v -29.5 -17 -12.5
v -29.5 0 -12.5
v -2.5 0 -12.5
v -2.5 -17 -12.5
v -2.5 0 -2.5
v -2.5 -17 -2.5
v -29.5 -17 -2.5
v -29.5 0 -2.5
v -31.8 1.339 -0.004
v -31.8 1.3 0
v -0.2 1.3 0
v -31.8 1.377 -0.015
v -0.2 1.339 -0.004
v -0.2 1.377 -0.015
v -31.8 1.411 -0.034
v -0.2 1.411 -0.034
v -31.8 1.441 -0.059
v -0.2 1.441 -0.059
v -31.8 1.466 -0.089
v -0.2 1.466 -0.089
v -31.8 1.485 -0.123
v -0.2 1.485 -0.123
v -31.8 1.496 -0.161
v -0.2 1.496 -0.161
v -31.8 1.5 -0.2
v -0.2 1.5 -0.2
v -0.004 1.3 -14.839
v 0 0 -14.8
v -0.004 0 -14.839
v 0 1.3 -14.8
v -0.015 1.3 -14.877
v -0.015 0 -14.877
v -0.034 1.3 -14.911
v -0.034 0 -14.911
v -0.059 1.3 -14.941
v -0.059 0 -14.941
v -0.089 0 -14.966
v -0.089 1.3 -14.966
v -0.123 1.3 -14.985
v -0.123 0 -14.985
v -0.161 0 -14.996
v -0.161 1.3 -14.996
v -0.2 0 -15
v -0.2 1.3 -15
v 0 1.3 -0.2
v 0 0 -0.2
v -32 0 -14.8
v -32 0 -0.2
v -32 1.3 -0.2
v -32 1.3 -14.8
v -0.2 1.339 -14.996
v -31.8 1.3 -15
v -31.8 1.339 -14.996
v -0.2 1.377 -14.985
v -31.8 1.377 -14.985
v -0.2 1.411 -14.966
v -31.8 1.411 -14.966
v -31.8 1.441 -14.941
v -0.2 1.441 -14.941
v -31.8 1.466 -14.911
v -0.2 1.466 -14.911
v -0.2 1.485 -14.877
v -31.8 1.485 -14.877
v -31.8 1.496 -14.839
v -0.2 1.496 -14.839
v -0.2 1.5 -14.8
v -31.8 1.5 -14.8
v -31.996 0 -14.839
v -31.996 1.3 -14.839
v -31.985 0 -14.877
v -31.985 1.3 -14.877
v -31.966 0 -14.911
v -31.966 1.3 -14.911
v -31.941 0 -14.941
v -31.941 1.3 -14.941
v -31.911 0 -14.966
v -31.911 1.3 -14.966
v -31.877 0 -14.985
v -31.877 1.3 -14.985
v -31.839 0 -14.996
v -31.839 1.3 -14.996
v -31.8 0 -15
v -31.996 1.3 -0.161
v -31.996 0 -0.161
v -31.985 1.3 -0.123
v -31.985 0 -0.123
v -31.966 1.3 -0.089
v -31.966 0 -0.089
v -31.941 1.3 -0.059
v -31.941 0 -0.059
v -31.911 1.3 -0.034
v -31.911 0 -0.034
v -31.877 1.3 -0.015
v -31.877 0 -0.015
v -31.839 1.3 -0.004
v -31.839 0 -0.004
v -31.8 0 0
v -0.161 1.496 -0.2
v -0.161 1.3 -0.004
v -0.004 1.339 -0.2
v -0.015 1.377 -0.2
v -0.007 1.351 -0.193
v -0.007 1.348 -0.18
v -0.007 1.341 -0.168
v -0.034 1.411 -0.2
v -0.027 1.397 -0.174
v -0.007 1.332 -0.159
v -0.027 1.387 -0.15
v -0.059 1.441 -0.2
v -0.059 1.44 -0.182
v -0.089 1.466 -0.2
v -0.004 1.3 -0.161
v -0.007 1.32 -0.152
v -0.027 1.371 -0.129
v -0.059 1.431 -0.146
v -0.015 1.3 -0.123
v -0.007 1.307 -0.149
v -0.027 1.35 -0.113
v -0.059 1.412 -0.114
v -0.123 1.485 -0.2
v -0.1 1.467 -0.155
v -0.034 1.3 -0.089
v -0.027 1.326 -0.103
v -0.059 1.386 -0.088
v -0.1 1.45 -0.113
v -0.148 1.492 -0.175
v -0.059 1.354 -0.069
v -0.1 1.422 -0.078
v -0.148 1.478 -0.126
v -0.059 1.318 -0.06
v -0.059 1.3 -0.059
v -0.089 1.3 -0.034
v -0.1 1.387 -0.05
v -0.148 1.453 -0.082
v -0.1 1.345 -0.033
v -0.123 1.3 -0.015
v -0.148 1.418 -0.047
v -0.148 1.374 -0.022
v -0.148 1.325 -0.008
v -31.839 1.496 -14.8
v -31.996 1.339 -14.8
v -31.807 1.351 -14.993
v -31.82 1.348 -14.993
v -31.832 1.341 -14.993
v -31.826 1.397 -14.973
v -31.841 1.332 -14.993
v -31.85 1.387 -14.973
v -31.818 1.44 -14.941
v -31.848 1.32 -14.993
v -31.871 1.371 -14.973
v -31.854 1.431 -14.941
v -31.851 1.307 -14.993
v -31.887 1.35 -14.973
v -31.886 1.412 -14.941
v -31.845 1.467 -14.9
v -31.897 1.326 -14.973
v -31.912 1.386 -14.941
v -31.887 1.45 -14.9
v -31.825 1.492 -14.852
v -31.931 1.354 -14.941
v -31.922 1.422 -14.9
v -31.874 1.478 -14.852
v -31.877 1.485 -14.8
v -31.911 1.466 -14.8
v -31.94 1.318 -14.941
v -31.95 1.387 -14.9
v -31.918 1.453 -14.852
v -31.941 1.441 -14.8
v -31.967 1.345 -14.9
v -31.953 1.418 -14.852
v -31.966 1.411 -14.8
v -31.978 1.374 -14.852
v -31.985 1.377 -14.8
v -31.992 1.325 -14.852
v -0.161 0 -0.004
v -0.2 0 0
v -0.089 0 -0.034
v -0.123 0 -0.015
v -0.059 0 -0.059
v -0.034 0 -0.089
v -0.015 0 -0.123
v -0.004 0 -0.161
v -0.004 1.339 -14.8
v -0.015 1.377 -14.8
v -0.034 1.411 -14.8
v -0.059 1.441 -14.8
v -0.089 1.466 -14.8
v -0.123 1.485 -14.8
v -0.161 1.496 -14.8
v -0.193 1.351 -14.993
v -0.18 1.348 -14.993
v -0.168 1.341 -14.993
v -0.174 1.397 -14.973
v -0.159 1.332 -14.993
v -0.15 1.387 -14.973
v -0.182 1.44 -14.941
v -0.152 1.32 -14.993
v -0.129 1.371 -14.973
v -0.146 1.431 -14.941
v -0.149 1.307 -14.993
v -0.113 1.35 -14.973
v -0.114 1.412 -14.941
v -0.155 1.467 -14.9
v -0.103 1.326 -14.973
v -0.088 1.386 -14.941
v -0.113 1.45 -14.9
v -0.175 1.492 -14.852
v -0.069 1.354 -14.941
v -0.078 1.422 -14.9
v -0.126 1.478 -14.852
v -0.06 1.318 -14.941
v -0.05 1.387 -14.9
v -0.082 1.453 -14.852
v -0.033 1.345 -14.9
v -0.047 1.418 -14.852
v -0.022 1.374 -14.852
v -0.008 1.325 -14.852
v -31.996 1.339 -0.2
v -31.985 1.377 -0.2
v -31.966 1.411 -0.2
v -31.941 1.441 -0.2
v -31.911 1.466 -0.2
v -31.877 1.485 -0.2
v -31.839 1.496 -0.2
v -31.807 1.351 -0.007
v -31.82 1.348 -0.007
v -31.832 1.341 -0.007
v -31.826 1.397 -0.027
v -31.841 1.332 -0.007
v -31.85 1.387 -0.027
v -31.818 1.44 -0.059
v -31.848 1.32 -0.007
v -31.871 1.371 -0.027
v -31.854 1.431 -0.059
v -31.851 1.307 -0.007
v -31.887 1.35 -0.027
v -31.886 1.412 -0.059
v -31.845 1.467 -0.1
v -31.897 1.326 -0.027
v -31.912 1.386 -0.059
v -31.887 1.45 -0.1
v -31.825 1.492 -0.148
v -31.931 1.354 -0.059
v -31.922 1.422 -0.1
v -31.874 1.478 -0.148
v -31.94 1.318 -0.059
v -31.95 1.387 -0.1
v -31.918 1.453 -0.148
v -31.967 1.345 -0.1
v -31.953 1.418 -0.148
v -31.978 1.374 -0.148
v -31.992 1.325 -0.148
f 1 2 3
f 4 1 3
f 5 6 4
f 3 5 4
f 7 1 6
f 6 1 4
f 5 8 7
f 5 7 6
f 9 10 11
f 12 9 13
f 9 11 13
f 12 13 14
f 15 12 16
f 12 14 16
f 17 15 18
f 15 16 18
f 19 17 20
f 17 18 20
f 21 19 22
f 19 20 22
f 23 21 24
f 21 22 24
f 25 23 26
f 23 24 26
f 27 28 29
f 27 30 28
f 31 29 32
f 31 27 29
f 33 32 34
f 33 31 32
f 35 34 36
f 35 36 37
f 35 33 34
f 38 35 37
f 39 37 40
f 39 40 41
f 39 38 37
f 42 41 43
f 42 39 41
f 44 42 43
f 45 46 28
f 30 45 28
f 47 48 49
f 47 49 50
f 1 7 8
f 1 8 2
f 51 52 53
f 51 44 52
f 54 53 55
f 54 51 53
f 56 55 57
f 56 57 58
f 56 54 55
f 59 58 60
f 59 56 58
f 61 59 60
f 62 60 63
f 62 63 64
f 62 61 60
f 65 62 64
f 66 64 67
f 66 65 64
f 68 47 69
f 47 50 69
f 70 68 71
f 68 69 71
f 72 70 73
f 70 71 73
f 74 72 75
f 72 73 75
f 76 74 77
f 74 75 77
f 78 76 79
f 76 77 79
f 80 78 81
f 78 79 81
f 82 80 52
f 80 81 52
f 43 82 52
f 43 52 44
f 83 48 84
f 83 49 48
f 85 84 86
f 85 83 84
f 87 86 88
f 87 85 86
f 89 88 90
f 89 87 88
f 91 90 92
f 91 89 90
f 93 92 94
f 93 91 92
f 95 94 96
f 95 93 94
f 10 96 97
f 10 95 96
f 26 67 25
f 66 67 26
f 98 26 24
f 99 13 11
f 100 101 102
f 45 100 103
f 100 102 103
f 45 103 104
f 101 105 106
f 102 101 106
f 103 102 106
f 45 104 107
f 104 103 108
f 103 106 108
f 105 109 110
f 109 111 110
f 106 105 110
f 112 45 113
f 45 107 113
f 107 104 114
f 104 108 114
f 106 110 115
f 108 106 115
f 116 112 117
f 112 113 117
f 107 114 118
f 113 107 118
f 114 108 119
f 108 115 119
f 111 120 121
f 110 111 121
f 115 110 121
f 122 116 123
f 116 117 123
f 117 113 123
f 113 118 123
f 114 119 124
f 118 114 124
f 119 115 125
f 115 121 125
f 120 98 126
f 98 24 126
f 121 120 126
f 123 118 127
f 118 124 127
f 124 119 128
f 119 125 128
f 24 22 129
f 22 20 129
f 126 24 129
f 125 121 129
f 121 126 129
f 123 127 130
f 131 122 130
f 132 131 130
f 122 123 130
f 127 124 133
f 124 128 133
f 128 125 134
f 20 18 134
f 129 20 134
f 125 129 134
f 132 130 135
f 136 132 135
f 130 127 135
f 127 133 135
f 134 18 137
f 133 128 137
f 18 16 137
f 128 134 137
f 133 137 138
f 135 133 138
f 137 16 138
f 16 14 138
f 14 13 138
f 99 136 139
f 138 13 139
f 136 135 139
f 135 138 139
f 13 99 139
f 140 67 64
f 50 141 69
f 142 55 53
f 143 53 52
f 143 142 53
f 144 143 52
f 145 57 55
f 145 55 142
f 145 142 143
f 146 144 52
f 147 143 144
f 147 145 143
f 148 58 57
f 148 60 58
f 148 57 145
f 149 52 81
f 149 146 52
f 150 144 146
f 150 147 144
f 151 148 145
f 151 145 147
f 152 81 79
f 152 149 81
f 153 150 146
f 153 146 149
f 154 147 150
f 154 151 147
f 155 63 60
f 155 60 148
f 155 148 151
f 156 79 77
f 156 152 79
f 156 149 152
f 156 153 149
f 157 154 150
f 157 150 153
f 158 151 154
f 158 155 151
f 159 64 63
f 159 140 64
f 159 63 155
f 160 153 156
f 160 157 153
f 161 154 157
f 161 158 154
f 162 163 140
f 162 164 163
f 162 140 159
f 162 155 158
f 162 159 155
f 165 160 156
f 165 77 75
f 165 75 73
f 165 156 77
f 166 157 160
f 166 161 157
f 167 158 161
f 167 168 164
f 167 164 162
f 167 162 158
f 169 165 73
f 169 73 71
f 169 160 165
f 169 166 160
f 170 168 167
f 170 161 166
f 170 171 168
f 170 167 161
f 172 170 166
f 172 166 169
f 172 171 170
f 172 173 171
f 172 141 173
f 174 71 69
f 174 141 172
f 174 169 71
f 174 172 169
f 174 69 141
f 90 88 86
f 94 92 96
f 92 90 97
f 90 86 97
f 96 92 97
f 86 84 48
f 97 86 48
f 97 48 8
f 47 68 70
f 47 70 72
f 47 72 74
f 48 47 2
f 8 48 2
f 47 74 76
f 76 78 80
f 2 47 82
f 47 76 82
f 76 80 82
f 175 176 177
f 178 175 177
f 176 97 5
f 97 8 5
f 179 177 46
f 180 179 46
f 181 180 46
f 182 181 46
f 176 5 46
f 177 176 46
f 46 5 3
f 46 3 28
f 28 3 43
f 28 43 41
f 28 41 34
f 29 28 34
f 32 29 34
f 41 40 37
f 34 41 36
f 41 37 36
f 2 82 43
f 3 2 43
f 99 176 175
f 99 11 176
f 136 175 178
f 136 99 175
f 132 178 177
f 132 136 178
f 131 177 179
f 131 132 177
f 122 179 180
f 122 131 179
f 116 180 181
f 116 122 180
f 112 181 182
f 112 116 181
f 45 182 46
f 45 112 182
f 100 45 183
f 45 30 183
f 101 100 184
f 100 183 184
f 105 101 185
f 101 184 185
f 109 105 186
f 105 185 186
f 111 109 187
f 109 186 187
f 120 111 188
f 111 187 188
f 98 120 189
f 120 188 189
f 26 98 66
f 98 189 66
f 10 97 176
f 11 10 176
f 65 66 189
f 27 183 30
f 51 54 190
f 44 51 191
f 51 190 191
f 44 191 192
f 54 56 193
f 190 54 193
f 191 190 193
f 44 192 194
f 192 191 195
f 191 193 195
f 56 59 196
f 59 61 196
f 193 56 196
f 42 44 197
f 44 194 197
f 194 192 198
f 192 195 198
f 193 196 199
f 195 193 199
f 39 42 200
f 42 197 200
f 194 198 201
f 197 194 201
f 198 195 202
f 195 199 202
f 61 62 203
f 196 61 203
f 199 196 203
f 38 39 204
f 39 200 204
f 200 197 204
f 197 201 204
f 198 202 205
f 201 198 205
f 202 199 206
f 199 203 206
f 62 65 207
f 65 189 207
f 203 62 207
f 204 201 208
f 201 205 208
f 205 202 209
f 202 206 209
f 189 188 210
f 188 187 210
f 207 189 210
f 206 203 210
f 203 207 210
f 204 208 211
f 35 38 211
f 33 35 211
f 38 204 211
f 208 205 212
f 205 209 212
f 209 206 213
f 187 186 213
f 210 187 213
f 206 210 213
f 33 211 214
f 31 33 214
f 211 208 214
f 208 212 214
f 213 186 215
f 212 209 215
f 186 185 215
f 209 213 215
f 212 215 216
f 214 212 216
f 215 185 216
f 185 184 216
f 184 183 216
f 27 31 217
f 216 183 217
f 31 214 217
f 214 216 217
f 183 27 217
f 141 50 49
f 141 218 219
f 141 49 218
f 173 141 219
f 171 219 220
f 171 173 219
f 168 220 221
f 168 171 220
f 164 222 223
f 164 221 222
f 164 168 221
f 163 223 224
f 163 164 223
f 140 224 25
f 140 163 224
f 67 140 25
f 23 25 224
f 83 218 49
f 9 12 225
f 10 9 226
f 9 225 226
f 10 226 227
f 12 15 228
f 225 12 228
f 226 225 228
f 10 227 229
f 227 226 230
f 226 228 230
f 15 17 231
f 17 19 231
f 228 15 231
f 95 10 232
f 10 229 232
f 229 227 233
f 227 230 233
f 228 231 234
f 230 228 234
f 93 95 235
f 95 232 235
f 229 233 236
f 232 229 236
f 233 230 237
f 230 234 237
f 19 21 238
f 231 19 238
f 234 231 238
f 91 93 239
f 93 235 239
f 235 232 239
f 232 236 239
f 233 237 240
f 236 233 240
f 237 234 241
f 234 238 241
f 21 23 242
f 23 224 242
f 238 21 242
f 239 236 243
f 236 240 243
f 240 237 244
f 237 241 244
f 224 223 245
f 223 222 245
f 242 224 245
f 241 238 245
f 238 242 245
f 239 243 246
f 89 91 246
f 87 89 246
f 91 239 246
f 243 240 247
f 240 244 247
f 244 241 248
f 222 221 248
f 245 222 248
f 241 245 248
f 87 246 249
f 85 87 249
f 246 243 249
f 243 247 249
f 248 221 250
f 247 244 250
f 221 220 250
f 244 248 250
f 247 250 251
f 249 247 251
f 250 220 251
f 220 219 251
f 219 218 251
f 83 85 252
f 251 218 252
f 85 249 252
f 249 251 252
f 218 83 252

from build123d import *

# Parameters (mm, degrees)
SKETCH1_W           = 32
SKETCH1_H           = 15
BOSS_EXTRUDE1_DEPTH = 1.5
FILLET2_R           = 0.2
SKETCH2_W           = 27
SKETCH2_H           = 10
BOSS_EXTRUDE2_DEPTH = 18.5


with BuildPart() as part:
    # Sketch1 → Boss-Extrude1 (new body)
    with BuildSketch(Plane(origin=(0, 0, 0), x_dir=(1, 0, 0), z_dir=(0, 1, 0))):
        with Locations((-16, 7.5)):
            Rectangle(SKETCH1_W, SKETCH1_H)
    extrude(amount=BOSS_EXTRUDE1_DEPTH)

    # Fillet2
    fillet2_edges = [part.edges().sort_by_distance(p)[0] for p in [
        (-32, 1.5, -7.5),
        (-16, 1.5, 0),
        (0, 1.5, -7.5),
        (-16, 1.5, -15),
        (0, 0.75, 0),
        (-32, 0.75, 0),
        (-32, 0.75, -15),
        (0, 0.75, -15),
    ]]
    fillet(fillet2_edges, radius=FILLET2_R)

    # Sketch2 → Boss-Extrude2 (add)
    with BuildSketch(Plane(origin=(0, 1.5, 0), x_dir=(1, 0, 0), z_dir=(0, 1, 0))):
        with Locations((-16, 7.5)):
            Rectangle(SKETCH2_W, SKETCH2_H)
    extrude(amount=-BOSS_EXTRUDE2_DEPTH)


solid = part.part
